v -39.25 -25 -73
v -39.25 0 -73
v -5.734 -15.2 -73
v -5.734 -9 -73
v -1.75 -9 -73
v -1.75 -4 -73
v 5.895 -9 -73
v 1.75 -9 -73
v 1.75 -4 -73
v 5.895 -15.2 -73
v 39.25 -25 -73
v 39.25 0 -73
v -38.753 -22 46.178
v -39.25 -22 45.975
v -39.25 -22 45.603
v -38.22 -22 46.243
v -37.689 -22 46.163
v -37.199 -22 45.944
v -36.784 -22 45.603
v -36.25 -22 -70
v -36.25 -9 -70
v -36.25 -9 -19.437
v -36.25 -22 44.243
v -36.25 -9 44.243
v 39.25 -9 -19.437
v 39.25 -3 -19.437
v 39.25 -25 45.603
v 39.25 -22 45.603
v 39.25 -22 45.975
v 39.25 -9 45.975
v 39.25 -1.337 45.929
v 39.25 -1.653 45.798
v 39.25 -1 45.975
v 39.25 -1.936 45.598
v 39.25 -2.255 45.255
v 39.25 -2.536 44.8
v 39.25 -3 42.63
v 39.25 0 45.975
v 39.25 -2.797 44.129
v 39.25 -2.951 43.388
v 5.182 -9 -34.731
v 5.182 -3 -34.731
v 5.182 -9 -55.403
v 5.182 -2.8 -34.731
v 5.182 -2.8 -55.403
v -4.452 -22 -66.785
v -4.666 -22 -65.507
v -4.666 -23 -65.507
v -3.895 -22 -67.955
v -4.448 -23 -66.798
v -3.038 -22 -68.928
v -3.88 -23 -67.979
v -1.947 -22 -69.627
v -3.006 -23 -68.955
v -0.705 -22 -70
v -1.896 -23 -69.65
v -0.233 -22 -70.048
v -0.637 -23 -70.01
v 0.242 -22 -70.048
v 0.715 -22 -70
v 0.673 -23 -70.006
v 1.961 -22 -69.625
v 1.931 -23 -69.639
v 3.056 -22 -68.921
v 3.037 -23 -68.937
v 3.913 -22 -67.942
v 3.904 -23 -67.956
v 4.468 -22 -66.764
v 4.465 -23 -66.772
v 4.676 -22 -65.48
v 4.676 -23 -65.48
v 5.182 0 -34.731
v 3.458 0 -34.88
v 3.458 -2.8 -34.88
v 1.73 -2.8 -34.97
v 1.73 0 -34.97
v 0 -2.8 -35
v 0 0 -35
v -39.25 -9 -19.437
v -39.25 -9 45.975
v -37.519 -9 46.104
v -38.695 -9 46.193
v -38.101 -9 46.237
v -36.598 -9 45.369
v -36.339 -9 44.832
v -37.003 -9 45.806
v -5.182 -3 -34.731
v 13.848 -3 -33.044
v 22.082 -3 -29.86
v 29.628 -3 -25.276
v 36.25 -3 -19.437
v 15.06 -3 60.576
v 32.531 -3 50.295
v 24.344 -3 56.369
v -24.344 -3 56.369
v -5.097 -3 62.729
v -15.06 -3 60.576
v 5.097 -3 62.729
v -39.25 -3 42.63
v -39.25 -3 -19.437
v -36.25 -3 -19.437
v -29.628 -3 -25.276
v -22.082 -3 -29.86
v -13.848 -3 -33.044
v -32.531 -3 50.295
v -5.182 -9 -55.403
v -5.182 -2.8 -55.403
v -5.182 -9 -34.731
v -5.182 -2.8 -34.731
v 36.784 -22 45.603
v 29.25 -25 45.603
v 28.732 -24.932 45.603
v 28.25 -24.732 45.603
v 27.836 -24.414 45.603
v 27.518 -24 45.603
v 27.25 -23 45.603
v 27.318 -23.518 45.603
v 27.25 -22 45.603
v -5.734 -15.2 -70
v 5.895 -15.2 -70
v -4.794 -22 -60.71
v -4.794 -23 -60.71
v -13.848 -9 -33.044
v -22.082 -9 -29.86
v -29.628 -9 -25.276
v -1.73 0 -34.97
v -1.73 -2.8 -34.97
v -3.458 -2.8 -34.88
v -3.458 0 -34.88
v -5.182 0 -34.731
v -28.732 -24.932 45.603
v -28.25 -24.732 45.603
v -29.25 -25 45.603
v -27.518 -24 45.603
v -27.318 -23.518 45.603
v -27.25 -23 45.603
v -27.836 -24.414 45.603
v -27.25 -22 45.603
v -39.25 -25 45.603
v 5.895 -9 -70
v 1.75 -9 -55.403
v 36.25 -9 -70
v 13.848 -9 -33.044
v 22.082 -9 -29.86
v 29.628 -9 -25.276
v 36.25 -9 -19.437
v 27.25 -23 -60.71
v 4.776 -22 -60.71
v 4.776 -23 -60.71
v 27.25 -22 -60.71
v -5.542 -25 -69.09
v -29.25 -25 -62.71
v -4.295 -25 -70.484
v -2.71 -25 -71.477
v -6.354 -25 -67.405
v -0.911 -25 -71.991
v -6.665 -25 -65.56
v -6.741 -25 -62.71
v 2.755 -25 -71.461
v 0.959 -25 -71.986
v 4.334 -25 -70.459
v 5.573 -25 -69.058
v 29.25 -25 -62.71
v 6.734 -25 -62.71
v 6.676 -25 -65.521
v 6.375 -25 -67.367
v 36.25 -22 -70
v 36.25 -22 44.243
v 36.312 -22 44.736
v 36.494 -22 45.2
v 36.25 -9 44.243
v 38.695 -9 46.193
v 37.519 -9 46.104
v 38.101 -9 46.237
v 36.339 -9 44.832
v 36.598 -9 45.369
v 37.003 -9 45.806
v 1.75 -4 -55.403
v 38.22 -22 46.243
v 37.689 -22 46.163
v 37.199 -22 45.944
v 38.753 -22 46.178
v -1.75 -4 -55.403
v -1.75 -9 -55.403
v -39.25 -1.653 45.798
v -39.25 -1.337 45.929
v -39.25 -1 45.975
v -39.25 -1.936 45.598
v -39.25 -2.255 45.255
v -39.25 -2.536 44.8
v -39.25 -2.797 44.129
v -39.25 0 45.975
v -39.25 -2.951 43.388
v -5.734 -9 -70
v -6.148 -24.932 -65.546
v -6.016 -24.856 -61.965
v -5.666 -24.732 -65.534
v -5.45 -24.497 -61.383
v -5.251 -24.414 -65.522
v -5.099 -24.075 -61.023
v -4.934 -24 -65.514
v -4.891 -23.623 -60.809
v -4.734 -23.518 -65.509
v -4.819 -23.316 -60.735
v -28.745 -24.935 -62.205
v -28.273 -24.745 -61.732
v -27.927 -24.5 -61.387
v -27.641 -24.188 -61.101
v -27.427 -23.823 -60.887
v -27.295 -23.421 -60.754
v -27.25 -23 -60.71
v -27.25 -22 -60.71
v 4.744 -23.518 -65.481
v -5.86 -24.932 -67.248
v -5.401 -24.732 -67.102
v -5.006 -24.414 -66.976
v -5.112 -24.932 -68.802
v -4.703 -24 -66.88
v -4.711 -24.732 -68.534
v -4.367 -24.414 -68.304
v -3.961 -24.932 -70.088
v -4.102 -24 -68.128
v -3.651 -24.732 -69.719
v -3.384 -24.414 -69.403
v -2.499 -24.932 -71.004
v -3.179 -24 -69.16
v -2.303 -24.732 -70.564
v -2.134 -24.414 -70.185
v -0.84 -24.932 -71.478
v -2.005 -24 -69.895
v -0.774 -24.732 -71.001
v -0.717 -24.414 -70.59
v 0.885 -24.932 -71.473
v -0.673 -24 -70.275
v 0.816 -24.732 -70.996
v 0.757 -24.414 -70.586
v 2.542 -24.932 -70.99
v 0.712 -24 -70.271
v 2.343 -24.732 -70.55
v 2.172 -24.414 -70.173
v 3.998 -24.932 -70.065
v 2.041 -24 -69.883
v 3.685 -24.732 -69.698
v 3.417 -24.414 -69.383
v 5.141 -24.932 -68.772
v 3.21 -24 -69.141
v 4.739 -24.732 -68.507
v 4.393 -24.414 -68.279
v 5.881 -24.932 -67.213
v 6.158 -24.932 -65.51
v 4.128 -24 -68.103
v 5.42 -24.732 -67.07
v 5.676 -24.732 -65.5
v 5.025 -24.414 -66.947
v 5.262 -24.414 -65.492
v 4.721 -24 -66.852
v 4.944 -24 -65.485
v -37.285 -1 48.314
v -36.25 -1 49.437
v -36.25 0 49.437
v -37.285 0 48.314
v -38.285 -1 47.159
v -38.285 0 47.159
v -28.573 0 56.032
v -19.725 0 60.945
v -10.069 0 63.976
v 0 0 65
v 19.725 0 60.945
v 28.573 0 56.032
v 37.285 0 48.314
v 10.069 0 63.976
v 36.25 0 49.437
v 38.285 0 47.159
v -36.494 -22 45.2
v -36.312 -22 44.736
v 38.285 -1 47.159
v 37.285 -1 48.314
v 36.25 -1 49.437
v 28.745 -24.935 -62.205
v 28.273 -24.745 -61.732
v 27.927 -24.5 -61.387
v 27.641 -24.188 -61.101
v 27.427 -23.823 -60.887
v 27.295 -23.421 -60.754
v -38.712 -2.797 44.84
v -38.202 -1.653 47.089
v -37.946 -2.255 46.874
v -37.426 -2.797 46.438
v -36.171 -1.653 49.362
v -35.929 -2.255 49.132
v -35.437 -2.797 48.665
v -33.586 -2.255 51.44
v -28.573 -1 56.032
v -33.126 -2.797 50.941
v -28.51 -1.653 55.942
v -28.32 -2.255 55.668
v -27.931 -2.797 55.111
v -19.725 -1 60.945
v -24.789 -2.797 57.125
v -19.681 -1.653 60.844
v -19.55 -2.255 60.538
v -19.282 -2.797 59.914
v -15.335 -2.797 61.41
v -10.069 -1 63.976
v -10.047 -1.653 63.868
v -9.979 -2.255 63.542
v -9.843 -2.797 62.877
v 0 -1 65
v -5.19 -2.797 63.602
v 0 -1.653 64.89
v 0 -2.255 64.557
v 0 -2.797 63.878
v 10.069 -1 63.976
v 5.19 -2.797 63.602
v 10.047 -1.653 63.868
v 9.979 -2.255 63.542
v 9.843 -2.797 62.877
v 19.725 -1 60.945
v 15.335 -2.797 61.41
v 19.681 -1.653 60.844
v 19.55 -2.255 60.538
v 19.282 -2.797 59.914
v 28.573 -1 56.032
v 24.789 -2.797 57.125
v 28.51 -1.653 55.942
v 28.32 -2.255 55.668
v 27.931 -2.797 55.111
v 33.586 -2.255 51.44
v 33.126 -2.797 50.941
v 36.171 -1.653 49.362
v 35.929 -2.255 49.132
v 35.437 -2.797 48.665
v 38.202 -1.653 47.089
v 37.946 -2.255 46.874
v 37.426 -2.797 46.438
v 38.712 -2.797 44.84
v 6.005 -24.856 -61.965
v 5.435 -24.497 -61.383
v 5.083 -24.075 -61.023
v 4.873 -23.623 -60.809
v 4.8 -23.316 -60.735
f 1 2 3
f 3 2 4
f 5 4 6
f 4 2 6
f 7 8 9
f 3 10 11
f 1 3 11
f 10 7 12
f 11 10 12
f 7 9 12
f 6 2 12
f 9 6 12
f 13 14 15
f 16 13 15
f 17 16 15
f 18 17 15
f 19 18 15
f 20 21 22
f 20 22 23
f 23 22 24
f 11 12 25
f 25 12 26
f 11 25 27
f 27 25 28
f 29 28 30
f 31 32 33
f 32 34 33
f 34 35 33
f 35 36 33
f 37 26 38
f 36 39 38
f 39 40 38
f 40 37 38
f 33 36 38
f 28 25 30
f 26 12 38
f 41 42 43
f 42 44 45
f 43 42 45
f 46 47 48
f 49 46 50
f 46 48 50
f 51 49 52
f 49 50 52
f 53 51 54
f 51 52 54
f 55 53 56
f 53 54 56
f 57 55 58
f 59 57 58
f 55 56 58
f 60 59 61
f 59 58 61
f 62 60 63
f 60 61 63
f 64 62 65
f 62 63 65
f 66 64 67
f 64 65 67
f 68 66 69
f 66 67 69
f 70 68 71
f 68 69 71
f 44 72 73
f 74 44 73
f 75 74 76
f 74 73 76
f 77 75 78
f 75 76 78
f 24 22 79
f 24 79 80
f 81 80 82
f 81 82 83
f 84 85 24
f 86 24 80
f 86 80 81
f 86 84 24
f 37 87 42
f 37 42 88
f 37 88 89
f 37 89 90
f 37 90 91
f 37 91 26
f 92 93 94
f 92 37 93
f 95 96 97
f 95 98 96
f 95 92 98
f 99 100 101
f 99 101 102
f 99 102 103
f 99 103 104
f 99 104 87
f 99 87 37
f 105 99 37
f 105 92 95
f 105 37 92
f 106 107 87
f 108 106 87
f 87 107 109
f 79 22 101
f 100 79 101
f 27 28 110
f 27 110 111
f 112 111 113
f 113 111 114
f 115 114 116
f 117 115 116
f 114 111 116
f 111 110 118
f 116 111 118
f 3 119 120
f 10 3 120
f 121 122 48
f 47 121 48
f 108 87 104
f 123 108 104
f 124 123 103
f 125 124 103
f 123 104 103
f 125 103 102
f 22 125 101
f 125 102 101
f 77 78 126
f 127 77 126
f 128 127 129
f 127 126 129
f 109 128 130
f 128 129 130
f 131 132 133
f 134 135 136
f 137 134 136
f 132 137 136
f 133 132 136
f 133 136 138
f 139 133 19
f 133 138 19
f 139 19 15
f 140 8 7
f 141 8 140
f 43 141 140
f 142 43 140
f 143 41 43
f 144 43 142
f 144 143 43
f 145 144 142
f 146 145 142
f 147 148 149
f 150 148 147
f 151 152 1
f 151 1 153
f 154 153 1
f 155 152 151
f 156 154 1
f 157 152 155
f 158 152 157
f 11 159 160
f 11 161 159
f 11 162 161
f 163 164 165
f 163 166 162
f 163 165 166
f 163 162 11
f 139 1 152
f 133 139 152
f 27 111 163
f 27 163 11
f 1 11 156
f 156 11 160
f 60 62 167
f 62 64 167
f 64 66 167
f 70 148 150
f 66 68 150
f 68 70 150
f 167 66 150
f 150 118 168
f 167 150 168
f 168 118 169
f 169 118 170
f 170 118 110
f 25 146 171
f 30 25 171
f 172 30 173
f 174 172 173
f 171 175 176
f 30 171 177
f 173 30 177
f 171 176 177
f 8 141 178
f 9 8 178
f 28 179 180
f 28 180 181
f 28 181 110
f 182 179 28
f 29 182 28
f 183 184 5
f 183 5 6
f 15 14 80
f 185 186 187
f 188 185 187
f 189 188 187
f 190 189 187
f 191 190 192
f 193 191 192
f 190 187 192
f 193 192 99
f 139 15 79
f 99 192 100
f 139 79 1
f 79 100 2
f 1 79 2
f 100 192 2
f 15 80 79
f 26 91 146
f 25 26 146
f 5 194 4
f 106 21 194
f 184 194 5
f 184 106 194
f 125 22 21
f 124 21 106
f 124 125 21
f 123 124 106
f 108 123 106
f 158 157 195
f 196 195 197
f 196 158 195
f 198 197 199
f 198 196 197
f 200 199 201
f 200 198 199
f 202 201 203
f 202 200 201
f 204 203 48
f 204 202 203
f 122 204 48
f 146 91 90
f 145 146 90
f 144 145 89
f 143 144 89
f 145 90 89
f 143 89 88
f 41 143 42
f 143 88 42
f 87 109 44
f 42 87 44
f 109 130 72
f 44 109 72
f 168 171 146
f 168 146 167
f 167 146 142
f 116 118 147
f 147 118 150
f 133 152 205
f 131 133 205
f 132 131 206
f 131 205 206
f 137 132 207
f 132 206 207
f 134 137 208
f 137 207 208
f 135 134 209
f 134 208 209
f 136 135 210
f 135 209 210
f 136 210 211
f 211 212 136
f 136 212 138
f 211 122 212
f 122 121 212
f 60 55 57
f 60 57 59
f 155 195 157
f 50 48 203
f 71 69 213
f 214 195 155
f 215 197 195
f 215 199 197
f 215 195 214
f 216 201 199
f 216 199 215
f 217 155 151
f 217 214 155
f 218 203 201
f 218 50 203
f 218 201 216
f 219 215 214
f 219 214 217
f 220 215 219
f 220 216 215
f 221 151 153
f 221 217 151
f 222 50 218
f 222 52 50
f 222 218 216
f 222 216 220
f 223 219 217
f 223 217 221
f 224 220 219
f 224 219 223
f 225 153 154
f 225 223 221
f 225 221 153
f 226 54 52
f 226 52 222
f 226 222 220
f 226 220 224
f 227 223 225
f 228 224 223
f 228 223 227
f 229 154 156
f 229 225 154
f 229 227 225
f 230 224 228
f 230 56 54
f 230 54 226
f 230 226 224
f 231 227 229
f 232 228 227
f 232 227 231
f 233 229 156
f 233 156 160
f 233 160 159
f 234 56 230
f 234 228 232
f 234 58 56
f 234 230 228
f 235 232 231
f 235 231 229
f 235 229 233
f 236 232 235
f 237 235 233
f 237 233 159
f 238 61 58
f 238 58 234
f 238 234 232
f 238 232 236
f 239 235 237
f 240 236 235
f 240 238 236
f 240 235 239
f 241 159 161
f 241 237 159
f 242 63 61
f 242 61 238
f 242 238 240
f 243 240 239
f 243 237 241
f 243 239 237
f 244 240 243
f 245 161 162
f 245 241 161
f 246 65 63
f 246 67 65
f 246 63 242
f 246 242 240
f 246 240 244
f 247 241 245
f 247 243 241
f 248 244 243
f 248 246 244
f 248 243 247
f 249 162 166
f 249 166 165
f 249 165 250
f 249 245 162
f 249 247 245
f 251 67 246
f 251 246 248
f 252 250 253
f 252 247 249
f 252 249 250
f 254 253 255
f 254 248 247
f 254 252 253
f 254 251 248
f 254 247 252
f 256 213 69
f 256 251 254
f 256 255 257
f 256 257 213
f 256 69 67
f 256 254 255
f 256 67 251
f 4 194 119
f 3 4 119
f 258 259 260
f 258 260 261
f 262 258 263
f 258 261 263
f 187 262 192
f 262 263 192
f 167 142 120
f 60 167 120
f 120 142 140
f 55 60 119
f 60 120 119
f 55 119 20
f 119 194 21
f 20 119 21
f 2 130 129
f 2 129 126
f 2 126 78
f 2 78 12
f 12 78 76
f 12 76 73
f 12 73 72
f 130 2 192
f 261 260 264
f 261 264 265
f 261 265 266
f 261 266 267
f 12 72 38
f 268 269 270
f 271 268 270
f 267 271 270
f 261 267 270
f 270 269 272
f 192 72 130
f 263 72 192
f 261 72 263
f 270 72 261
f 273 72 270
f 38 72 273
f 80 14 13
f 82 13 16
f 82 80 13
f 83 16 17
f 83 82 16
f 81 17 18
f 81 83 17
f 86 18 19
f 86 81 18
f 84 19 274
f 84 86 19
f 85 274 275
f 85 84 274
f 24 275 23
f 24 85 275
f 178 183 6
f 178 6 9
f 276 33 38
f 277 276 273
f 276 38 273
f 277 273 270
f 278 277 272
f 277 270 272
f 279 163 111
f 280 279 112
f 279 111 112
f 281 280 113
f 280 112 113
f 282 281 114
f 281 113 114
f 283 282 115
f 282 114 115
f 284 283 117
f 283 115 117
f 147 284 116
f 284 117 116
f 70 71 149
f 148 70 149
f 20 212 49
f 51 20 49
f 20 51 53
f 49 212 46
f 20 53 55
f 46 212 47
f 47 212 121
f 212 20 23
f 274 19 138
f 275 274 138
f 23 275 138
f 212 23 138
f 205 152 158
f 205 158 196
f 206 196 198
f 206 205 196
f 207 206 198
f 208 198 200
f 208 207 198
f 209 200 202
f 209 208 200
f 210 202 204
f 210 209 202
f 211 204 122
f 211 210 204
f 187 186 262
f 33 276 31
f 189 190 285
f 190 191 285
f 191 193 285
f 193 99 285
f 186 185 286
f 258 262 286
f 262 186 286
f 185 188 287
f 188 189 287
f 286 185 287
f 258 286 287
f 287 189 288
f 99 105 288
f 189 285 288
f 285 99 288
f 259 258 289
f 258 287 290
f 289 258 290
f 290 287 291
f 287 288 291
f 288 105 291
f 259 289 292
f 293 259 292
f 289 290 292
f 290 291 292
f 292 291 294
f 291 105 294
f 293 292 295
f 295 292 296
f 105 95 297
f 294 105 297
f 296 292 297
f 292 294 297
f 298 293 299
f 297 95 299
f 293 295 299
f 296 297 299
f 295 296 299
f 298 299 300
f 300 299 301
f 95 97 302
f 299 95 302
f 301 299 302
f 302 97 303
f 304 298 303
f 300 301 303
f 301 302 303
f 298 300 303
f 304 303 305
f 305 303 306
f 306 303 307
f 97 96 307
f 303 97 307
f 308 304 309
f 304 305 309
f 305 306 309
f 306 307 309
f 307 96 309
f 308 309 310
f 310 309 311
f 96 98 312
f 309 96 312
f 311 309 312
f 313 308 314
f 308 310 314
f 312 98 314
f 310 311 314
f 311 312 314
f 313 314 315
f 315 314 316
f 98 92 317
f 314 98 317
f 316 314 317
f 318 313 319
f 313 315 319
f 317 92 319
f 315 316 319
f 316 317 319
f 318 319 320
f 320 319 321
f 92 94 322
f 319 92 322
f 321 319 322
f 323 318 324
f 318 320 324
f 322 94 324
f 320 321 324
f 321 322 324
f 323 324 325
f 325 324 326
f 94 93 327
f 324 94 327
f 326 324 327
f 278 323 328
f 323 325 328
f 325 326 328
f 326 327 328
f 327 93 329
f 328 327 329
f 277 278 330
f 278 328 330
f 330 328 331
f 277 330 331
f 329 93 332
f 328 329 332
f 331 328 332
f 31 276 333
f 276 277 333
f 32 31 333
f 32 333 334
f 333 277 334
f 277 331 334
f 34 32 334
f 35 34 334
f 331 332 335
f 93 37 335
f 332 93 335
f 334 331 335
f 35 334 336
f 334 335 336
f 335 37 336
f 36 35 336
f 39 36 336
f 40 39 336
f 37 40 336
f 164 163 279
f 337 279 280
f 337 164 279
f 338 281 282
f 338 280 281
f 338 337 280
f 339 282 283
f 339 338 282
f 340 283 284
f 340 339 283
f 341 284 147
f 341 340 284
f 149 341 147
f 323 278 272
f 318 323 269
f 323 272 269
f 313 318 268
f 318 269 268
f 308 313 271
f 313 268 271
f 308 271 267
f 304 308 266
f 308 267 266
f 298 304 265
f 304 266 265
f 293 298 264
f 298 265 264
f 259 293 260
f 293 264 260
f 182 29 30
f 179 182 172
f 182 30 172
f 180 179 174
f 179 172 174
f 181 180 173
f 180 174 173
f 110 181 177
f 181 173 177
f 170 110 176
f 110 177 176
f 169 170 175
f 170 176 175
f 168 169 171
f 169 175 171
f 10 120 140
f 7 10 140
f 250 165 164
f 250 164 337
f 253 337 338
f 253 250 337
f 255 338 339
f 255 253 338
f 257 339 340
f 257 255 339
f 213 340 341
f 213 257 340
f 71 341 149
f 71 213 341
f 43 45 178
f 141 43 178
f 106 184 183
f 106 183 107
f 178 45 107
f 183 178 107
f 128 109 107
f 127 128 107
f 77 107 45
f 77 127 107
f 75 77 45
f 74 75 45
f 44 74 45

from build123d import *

# Parameters (mm, degrees)
F1_DEPTH      = 3
F2_DEPTH      = 9
F3_DEPTH      = 22
F4_DEPTH      = 22
F5_DEPTH      = 22
F6_W          = 6
F6_H          = 68.8748865698
F7_DEPTH      = 4
F8_W          = 6
F8_H          = 68.8748865698
F9_DEPTH      = 4
F10_DEPTH     = 2.8
F11_W         = 3.5
F11_H         = 14.5974665339
F12_DEPTH     = 5
F14_DEPTH     = 4
F15_DEPTH     = 4
F16_W         = 54.5
F16_H         = 12.2903782427
F17_DEPTH     = 3
F19_DEPTH     = 3
F20_T1_DEPTH  = 111.3131168485
F20_T3_DEPTH  = 27.4743105508
F20_T5_DEPTH  = 27.4558316657
F20_T7_DEPTH  = 9.7989282925
F20_T9_DEPTH  = 13
F20_T11_DEPTH = 9.7709294909
F20_T14_ANGLE = 114.906593859
F20_T16_ANGLE = 177.2719132967
F20_T21_DEPTH = 111.3131168485
F20_T25_DEPTH = 32.4558316657
F20_T32_DEPTH = 32.4743105508
F20_T36_DEPTH = 111.3131168485


# Not quite as in the source:
# - a fillet or chamfer that OpenCascade refuses, or shapes differently, is made with other operations: its cross-section is extruded or revolved along the edge and cut away or added


with BuildPart() as f1:
    # F0 (on Front) → F1 (new body)
    with BuildSketch(Plane.XZ):
        with BuildLine():
            Line((36.25, -19.4374432849), (36.25, 49.4374432849))
            ThreePointArc((36.25, 49.4374432849), (0, 65), (-36.25, 49.4374432849))
            Line((-36.25, 49.4374432849), (-36.25, -19.4374432849))
            ThreePointArc((-36.25, -19.4374432849), (-22.0820535862, -29.8595910527), (-5.1816573471, -34.7307794745))
            Line((-5.1816573471, -34.7307794745), (5.1816573471, -34.7307794745))
            ThreePointArc((5.1816573471, -34.7307794745), (22.0820535862, -29.8595910527), (36.25, -19.4374432849))
        make_face()
    extrude(amount=F1_DEPTH)

    # F0 (on Front) → F2 (join)
    with BuildSketch(Plane.XZ):
        with BuildLine():
            Line((36.25, -70), (36.25, -19.4374432849))
            ThreePointArc((36.25, -19.4374432849), (22.0820535862, -29.8595910527), (5.1816573471, -34.7307794745))
            Line((5.1816573471, -34.7307794745), (5.1816573471, -55.4025334661))
            Line((5.1816573471, -55.4025334661), (-5.1816573471, -55.4025334661))
            Line((-5.1816573471, -55.4025334661), (-5.1816573471, -34.7307794745))
            ThreePointArc((-5.1816573471, -34.7307794745), (-22.0820535862, -29.8595910527), (-36.25, -19.4374432849))
            Line((-36.25, -19.4374432849), (-36.25, -70))
            Line((-36.25, -70), (36.25, -70))
        make_face()
    extrude(amount=F2_DEPTH)

    # F0 (on Front) → F3 (join)
    with BuildSketch(Plane.XZ):
        with BuildLine():
            ThreePointArc((39.25, -15.9747881349), (37.7896810673, -17.7404948776), (36.25, -19.4374432849))
            Line((36.25, -19.4374432849), (36.25, -70))
            Line((36.25, -70), (-36.25, -70))
            Line((-36.25, -70), (-36.25, -19.4374432849))
            ThreePointArc((-36.25, -19.4374432849), (-37.7896810674, -17.7404948776), (-39.25, -15.9747881349))
            Line((-39.25, -15.9747881349), (-39.25, -73))
            Line((-39.25, -73), (39.25, -73))
            Line((39.25, -73), (39.25, -15.9747881349))
        make_face()
    extrude(amount=F3_DEPTH)

    # F0 (on Front) → F4 (join)
    with BuildSketch(Plane.XZ):
        with BuildLine():
            Line((-36.25, -19.4374432849), (-36.25, 49.4374432849))
            ThreePointArc((-36.25, 49.4374432849), (-37.7896810673, 47.7404948776), (-39.25, 45.9747881349))
            Line((-39.25, 45.9747881349), (-39.25, -15.9747881349))
            ThreePointArc((-39.25, -15.9747881349), (-37.7896810674, -17.7404948776), (-36.25, -19.4374432849))
        make_face()
    extrude(amount=F4_DEPTH)

    # F0 (on Front) → F5 (join)
    with BuildSketch(Plane.XZ):
        with BuildLine():
            ThreePointArc((39.25, 45.9747881349), (37.7896810673, 47.7404948776), (36.25, 49.4374432849))
            Line((36.25, 49.4374432849), (36.25, -19.4374432849))
            ThreePointArc((36.25, -19.4374432849), (37.7896810673, -17.7404948776), (39.25, -15.9747881349))
            Line((39.25, -15.9747881349), (39.25, 45.9747881349))
        make_face()
    extrude(amount=F5_DEPTH)

    # F6 (on face) → F7 (cut)
    with BuildSketch(Plane.YZ.offset(-36.25)):
        with Locations((-6, 15)):
            Rectangle(F6_W, F6_H)
    extrude(amount=-F7_DEPTH, mode=Mode.SUBTRACT)

    # F8 (on face) → F9 (cut)
    with BuildSketch(Plane(origin=(36.25, 0, 0), x_dir=(0, -1, 0), z_dir=(-1, 0, 0))):
        with Locations((6, 15)):
            Rectangle(F8_W, F8_H)
    extrude(amount=-F9_DEPTH, mode=Mode.SUBTRACT)

    # F0 (on Front) → F10 (join)
    with BuildSketch(Plane.XZ):
        with BuildLine():
            Line((5.1816573471, -55.4025334661), (5.1816573471, -34.7307794745))
            ThreePointArc((5.1816573471, -34.7307794745), (2.5943232525, -34.9326495077), (0, -35))
            ThreePointArc((0, -35), (-2.5943232525, -34.9326495077), (-5.1816573471, -34.7307794745))
            Line((-5.1816573471, -34.7307794745), (-5.1816573471, -55.4025334661))
            Line((-5.1816573471, -55.4025334661), (5.1816573471, -55.4025334661))
        make_face()
    extrude(amount=F10_DEPTH)

    # F11 (on face) → F12 (cut)
    with BuildSketch(Plane.XZ.offset(9)):
        with Locations((0, -62.7012667331)):
            Rectangle(F11_W, F11_H)
    extrude(amount=-F12_DEPTH, mode=Mode.SUBTRACT)

    # F13 (on face) → F14 (cut)
    with BuildSketch(Plane.XY.offset(-70)):
        Polygon((-1.75, -9), (-5.7336706668, -9), (-5.7336706668, -15.2), (5.8953360592, -15.2), (5.8953360592, -9), (1.75, -9), align=None)
    extrude(amount=-F14_DEPTH, mode=Mode.SUBTRACT)

    # F15 (cut): a face of the model
    f15_faces = [f1.faces().sort_by_distance(p)[0] for p in [
        (0, -6.5, -70),
    ]]
    extrude(f15_faces, amount=-F15_DEPTH, mode=Mode.SUBTRACT)

    # F16 (on face) → F17 (join)
    with BuildSketch(Plane.XZ.offset(22)):
        Polygon((-39.25, 45.6034950912), (-39.25, -73), (-27.25, -73), (-27.25, -60.7096217573), (-27.25, 45.6034950912), align=None)
        with Locations((0, -66.8548108786)):
            Rectangle(F16_W, F16_H)
        Polygon((27.25, -60.7096217573), (27.25, -73), (39.25, -73), (39.25, 45.6034950912), (27.25, 45.6034950912), align=None)
    extrude(amount=F17_DEPTH)

    # F18 (on face) → F19 (cut)
    with BuildSketch(Plane.XZ.offset(25)):
        with BuildLine():
            ThreePointArc((0.0047599162, -60.7096217573), (-3.3429375433, -62.1225677813), (-4.6658988973, -65.5068355016))
            ThreePointArc((-4.6658988973, -65.5068355016), (0.0184260463, -70.0542581163), (4.6760694509, -65.4795110707))
            ThreePointArc((4.6760694509, -65.4795110707), (4.6768334539, -65.4307331593), (4.6770881308, -65.3819499298))
            ThreePointArc((4.6770881308, -65.3819499298), (3.3085948781, -62.0781149802), (0.0047599162, -60.7096217573))
        make_face()
        with BuildLine():
            ThreePointArc((4.6770881308, -65.3819499298), (4.6768334539, -65.4307331593), (4.6760694509, -65.4795110707))
            Line((4.6760694509, -65.4795110707), (4.7756894492, -60.7096217573))
            Line((4.7756894492, -60.7096217573), (0.0047599162, -60.7096217573))
            ThreePointArc((0.0047599162, -60.7096217573), (3.3085948781, -62.0781149802), (4.6770881308, -65.3819499298))
        make_face()
        with BuildLine():
            Line((-4.7941683343, -60.7096217573), (-4.6658988973, -65.5068355016))
            ThreePointArc((-4.6658988973, -65.5068355016), (-3.3429375433, -62.1225677813), (0.0047599162, -60.7096217573))
            Line((0.0047599162, -60.7096217573), (-4.7941683343, -60.7096217573))
        make_face()
    extrude(amount=-F19_DEPTH, mode=Mode.SUBTRACT)

    # F20: fillet of radius 2 on 10 edges, made by hand

    # F20_s2 → F20_t1 (cut)
    with BuildSketch(Plane.XY.offset(-60.7096217573)):
        with BuildLine():
            ThreePointArc((-29.25, -25), (-27.8357864376, -24.4142135624), (-27.25, -23))
            Line((-27.25, -23), (-27.25, -25))
            Line((-27.25, -25), (-29.25, -25))
        make_face()
        with BuildLine():
            ThreePointArc((29.25, -25), (27.8357864376, -24.4142135624), (27.25, -23))
            Line((27.25, -23), (27.25, -25))
            Line((27.25, -25), (29.25, -25))
        make_face()
    extrude(amount=F20_T1_DEPTH, mode=Mode.SUBTRACT)

    # F20_s4 → F20_t3 (cut)
    with BuildSketch(Plane.YZ.offset(-0.2243105508)):
        with BuildLine():
            ThreePointArc((-25, -62.7096217573), (-24.4142135624, -61.2954081949), (-23, -60.7096217573))
            Line((-23, -60.7096217573), (-25, -60.7096217573))
            Line((-25, -60.7096217573), (-25, -62.7096217573))
        make_face()
    extrude(amount=F20_T3_DEPTH, mode=Mode.SUBTRACT)

    # F20_s6 → F20_t5 (cut)
    with BuildSketch(Plane.YZ.offset(-27.25)):
        with BuildLine():
            ThreePointArc((-25, -62.7096217573), (-24.4142135624, -61.2954081949), (-23, -60.7096217573))
            Line((-23, -60.7096217573), (-25, -60.7096217573))
            Line((-25, -60.7096217573), (-25, -62.7096217573))
        make_face()
    extrude(amount=F20_T5_DEPTH, mode=Mode.SUBTRACT)

    # F20_s8 → F20_t7 (cut)
    with BuildSketch(Plane(origin=(1.4850446734, 0, -55.5399391245), x_dir=(0, 1, 0), z_dir=(0.0267287672, 0, -0.9996427227))):
        with BuildLine():
            ThreePointArc((-25, -8.4151488306), (-24.4142135624, -7.0009352682), (-23, -6.4151488306))
            Line((-23, -6.4151488306), (-25, -6.4151488306))
            Line((-25, -6.4151488306), (-25, -8.4151488306))
        make_face()
    extrude(amount=F20_T7_DEPTH, mode=Mode.SUBTRACT)

    # F20_s10 → F20_t9 (cut)
    with BuildSketch(Plane.XZ.offset(9)):
        with BuildLine():
            ThreePointArc((39.25, 45.9747881349), (37.25, 45.9747881349), (36.25, 44.2427373273))
            Line((36.25, 44.2427373273), (36.25, 49.4374432849))
            ThreePointArc((36.25, 49.4374432849), (37.7896810673, 47.7404948776), (39.25, 45.9747881349))
        make_face()
        with BuildLine():
            ThreePointArc((-39.25, 45.9747881349), (-37.25, 45.9747881349), (-36.25, 44.2427373273))
            Line((-36.25, 44.2427373273), (-36.25, 49.4374432849))
            ThreePointArc((-36.25, 49.4374432849), (-37.7896810673, 47.7404948776), (-39.25, 45.9747881349))
        make_face()
    extrude(amount=F20_T9_DEPTH, mode=Mode.SUBTRACT)

    # F20_s12 → F20_t11 (cut)
    with BuildSketch(Plane(origin=(-1.3649163722, 0, -65.3533439927), x_dir=(0, 1, 0), z_dir=(0.0208806268, 0, 0.9997819759))):
        with BuildLine():
            ThreePointArc((-25, -8.0423031905), (-24.4142135624, -6.6280896281), (-23, -6.0423031905))
            Line((-23, -6.0423031905), (-25, -6.0423031905))
            Line((-25, -6.0423031905), (-25, -8.0423031905))
        make_face()
    extrude(amount=F20_T11_DEPTH, mode=Mode.SUBTRACT)

    # F20_s13 → F20_t14 (revolve, cut)
    with BuildSketch(Plane(origin=(6.8024666518, 0, 10.65855148), x_dir=(0, 1, 0), z_dir=(-0.537986897, 0, -0.8429532008))):
        with BuildLine():
            ThreePointArc((-1, -58.0698034549), (-2.4142135624, -57.4840170172), (-3, -56.0698034549))
            Line((-3, -56.0698034549), (-3, -58.0698034549))
            Line((-3, -58.0698034549), (-1, -58.0698034549))
        make_face()
    revolve(axis=Axis((0, -3, 15), (0, 1, 0)), revolution_arc=F20_T14_ANGLE, mode=Mode.SUBTRACT)

    # F20_s15 → F20_t16 (revolve, cut)
    with BuildSketch(Plane(origin=(1.746957946, 0, -65.3353664822), x_dir=(0, 1, 0), z_dir=(-0.0267287672, 0, 0.9996427227))):
        with BuildLine():
            ThreePointArc((-25, 8.4151488306), (-24.4142135624, 7.0009352682), (-23, 6.4151488306))
            Line((-23, 6.4151488306), (-25, 6.4151488306))
            Line((-25, 6.4151488306), (-25, 8.4151488306))
        make_face()
    revolve(axis=Axis((0.0047599583, -25, -65.3819499298), (0, -1, 0)), revolution_arc=F20_T16_ANGLE, mode=Mode.SUBTRACT)


with BuildPart() as f20_tool19:
    # F20_s20 → F20_t21 (new body)
    with BuildSketch(Plane.XY.offset(-65.7096217573)):
        with BuildLine():
            ThreePointArc((-29.25, -25), (-27.8357864376, -24.4142135624), (-27.25, -23))
            Line((-27.25, -23), (-27.25, -25))
            Line((-27.25, -25), (-29.25, -25))
        make_face()
    extrude(amount=F20_T21_DEPTH)

    split(bisect_by=Plane.XY.offset(-60.7096217573), keep=Keep.BOTTOM)


with BuildPart() as f20_tool23:
    # F20_s24 → F20_t25 (new body)
    with BuildSketch(Plane.YZ.offset(0.2058316657)):
        with BuildLine():
            ThreePointArc((-25, -62.7096217573), (-24.4142135624, -61.2954081949), (-23, -60.7096217573))
            Line((-23, -60.7096217573), (-25, -60.7096217573))
            Line((-25, -60.7096217573), (-25, -62.7096217573))
        make_face()
    extrude(amount=-F20_T25_DEPTH)

    split(bisect_by=Plane.YZ.offset(-27.25), keep=Keep.BOTTOM)


with BuildPart() as f20_tool19_1:
    add(f20_tool19.part)

    # F20_t27: intersect F20_tool23
    add(f20_tool23.part, mode=Mode.INTERSECT)


with BuildPart() as f1_1:
    add(f1.part)

    # F20_t17: cut F20_tool19
    add(f20_tool19_1.part, mode=Mode.SUBTRACT)


with BuildPart() as f20_tool30:
    # F20_s31 → F20_t32 (new body)
    with BuildSketch(Plane.YZ.offset(32.25)):
        with BuildLine():
            ThreePointArc((-25, -62.7096217573), (-24.4142135624, -61.2954081949), (-23, -60.7096217573))
            Line((-23, -60.7096217573), (-25, -60.7096217573))
            Line((-25, -60.7096217573), (-25, -62.7096217573))
        make_face()
    extrude(amount=-F20_T32_DEPTH)

    split(bisect_by=Plane.YZ.offset(27.25), keep=Keep.TOP)


with BuildPart() as f20_tool34:
    # F20_s35 → F20_t36 (new body)
    with BuildSketch(Plane.XY.offset(45.6034950912)):
        with BuildLine():
            ThreePointArc((29.25, -25), (27.8357864376, -24.4142135624), (27.25, -23))
            Line((27.25, -23), (27.25, -25))
            Line((27.25, -25), (29.25, -25))
        make_face()
    extrude(amount=-F20_T36_DEPTH)

    split(bisect_by=Plane.XY.offset(-60.7096217573), keep=Keep.BOTTOM)


with BuildPart() as f20_tool30_1:
    add(f20_tool30.part)

    # F20_t38: intersect F20_tool34
    add(f20_tool34.part, mode=Mode.INTERSECT)


with BuildPart() as f1_2:
    add(f1_1.part)

    # F20_t28: cut F20_tool30
    add(f20_tool30_1.part, mode=Mode.SUBTRACT)


solid = f1_2.part
